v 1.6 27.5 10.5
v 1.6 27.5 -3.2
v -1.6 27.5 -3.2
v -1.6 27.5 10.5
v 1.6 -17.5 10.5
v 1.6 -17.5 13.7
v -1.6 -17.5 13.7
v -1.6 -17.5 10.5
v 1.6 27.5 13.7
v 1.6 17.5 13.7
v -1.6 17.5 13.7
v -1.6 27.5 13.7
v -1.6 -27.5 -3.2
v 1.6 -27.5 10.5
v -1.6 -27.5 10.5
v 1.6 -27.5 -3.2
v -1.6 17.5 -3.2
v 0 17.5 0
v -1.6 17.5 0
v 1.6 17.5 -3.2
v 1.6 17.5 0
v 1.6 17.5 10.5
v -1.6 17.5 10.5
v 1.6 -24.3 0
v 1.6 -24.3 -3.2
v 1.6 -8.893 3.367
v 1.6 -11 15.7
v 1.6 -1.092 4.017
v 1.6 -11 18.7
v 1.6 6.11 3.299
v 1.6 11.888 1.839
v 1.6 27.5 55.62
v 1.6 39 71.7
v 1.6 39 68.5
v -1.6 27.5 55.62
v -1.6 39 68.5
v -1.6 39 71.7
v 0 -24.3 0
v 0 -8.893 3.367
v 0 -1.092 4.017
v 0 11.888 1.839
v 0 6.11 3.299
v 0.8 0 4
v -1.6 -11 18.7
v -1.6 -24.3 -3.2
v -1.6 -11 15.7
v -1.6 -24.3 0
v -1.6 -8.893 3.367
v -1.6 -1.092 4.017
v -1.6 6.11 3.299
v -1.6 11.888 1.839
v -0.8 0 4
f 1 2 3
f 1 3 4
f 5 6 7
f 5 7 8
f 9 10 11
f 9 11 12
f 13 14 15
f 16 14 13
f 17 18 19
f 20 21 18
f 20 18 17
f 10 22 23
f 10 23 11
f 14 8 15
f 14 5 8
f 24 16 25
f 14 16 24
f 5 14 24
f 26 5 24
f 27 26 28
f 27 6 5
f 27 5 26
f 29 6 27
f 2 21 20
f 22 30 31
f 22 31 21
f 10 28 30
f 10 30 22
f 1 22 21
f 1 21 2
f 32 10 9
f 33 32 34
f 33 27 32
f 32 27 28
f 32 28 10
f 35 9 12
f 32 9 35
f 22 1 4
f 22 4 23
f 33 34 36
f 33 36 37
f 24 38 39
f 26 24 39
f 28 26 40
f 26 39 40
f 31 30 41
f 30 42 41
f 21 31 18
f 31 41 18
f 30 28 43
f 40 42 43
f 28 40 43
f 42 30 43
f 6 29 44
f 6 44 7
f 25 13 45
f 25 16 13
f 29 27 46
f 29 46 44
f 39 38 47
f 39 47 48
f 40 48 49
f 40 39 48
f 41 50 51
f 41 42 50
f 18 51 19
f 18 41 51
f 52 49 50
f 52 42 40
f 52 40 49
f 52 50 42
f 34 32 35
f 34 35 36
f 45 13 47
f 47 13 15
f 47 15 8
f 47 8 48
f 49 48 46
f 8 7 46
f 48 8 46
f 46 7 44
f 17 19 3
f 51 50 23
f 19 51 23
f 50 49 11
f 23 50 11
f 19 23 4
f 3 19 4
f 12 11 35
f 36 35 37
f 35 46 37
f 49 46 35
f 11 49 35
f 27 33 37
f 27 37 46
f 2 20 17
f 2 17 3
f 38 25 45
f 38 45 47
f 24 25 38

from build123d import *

# Parameters (mm, degrees)
F1_DEPTH = 1.6


# Not quite as in the source:
# - a feature names something its author has since deleted; it is built from what else it names


with BuildPart() as f1:
    # F0 (on Right) → F1 (new body, symmetric)
    with BuildSketch(Plane.YZ):
        with BuildLine():
            Line((-27.5, 0), (-27.5, -3.2))
            Line((-27.5, -3.2), (-24.3, -3.2))
            Line((-24.3, -3.2), (-24.3, 0))
            add(Edge.make_bspline(
                [(-24.3, 0), (-15.858107704, 2.1141811864), (-0.2087572903, 6.0333927878), (11.9158815387, 1.9025152075), (17.5, 0)],
                knots=[0, 0, 0, 0, 0.5394404287, 1, 1, 1, 1], degree=3))
            Line((17.5, 0), (17.5, -3.2))
            Line((17.5, -3.2), (27.5, -3.2))
            Line((27.5, -3.2), (27.5, 0))
            Line((27.5, 0), (27.5, 10.5))
            Line((27.5, 10.5), (17.5, 10.5))
            Line((17.5, 10.5), (17.5, 13.7))
            Line((17.5, 13.7), (27.5, 13.7))
            Line((27.5, 13.7), (27.5, 55.6200032))
            Line((27.5, 55.6200032), (39, 68.5000032))
            Line((39, 68.5000032), (39, 71.7))
            Line((39, 71.7), (-11, 15.7))
            Line((-11, 15.7), (-11, 18.7))
            Line((-11, 18.7), (-17.5, 13.7))
            Line((-17.5, 13.7), (-17.5, 10.5))
            Line((-17.5, 10.5), (-27.5, 10.5))
            Line((-27.5, 10.5), (-27.5, 0))
        make_face()
    extrude(amount=F1_DEPTH, both=True)


solid = f1.part
